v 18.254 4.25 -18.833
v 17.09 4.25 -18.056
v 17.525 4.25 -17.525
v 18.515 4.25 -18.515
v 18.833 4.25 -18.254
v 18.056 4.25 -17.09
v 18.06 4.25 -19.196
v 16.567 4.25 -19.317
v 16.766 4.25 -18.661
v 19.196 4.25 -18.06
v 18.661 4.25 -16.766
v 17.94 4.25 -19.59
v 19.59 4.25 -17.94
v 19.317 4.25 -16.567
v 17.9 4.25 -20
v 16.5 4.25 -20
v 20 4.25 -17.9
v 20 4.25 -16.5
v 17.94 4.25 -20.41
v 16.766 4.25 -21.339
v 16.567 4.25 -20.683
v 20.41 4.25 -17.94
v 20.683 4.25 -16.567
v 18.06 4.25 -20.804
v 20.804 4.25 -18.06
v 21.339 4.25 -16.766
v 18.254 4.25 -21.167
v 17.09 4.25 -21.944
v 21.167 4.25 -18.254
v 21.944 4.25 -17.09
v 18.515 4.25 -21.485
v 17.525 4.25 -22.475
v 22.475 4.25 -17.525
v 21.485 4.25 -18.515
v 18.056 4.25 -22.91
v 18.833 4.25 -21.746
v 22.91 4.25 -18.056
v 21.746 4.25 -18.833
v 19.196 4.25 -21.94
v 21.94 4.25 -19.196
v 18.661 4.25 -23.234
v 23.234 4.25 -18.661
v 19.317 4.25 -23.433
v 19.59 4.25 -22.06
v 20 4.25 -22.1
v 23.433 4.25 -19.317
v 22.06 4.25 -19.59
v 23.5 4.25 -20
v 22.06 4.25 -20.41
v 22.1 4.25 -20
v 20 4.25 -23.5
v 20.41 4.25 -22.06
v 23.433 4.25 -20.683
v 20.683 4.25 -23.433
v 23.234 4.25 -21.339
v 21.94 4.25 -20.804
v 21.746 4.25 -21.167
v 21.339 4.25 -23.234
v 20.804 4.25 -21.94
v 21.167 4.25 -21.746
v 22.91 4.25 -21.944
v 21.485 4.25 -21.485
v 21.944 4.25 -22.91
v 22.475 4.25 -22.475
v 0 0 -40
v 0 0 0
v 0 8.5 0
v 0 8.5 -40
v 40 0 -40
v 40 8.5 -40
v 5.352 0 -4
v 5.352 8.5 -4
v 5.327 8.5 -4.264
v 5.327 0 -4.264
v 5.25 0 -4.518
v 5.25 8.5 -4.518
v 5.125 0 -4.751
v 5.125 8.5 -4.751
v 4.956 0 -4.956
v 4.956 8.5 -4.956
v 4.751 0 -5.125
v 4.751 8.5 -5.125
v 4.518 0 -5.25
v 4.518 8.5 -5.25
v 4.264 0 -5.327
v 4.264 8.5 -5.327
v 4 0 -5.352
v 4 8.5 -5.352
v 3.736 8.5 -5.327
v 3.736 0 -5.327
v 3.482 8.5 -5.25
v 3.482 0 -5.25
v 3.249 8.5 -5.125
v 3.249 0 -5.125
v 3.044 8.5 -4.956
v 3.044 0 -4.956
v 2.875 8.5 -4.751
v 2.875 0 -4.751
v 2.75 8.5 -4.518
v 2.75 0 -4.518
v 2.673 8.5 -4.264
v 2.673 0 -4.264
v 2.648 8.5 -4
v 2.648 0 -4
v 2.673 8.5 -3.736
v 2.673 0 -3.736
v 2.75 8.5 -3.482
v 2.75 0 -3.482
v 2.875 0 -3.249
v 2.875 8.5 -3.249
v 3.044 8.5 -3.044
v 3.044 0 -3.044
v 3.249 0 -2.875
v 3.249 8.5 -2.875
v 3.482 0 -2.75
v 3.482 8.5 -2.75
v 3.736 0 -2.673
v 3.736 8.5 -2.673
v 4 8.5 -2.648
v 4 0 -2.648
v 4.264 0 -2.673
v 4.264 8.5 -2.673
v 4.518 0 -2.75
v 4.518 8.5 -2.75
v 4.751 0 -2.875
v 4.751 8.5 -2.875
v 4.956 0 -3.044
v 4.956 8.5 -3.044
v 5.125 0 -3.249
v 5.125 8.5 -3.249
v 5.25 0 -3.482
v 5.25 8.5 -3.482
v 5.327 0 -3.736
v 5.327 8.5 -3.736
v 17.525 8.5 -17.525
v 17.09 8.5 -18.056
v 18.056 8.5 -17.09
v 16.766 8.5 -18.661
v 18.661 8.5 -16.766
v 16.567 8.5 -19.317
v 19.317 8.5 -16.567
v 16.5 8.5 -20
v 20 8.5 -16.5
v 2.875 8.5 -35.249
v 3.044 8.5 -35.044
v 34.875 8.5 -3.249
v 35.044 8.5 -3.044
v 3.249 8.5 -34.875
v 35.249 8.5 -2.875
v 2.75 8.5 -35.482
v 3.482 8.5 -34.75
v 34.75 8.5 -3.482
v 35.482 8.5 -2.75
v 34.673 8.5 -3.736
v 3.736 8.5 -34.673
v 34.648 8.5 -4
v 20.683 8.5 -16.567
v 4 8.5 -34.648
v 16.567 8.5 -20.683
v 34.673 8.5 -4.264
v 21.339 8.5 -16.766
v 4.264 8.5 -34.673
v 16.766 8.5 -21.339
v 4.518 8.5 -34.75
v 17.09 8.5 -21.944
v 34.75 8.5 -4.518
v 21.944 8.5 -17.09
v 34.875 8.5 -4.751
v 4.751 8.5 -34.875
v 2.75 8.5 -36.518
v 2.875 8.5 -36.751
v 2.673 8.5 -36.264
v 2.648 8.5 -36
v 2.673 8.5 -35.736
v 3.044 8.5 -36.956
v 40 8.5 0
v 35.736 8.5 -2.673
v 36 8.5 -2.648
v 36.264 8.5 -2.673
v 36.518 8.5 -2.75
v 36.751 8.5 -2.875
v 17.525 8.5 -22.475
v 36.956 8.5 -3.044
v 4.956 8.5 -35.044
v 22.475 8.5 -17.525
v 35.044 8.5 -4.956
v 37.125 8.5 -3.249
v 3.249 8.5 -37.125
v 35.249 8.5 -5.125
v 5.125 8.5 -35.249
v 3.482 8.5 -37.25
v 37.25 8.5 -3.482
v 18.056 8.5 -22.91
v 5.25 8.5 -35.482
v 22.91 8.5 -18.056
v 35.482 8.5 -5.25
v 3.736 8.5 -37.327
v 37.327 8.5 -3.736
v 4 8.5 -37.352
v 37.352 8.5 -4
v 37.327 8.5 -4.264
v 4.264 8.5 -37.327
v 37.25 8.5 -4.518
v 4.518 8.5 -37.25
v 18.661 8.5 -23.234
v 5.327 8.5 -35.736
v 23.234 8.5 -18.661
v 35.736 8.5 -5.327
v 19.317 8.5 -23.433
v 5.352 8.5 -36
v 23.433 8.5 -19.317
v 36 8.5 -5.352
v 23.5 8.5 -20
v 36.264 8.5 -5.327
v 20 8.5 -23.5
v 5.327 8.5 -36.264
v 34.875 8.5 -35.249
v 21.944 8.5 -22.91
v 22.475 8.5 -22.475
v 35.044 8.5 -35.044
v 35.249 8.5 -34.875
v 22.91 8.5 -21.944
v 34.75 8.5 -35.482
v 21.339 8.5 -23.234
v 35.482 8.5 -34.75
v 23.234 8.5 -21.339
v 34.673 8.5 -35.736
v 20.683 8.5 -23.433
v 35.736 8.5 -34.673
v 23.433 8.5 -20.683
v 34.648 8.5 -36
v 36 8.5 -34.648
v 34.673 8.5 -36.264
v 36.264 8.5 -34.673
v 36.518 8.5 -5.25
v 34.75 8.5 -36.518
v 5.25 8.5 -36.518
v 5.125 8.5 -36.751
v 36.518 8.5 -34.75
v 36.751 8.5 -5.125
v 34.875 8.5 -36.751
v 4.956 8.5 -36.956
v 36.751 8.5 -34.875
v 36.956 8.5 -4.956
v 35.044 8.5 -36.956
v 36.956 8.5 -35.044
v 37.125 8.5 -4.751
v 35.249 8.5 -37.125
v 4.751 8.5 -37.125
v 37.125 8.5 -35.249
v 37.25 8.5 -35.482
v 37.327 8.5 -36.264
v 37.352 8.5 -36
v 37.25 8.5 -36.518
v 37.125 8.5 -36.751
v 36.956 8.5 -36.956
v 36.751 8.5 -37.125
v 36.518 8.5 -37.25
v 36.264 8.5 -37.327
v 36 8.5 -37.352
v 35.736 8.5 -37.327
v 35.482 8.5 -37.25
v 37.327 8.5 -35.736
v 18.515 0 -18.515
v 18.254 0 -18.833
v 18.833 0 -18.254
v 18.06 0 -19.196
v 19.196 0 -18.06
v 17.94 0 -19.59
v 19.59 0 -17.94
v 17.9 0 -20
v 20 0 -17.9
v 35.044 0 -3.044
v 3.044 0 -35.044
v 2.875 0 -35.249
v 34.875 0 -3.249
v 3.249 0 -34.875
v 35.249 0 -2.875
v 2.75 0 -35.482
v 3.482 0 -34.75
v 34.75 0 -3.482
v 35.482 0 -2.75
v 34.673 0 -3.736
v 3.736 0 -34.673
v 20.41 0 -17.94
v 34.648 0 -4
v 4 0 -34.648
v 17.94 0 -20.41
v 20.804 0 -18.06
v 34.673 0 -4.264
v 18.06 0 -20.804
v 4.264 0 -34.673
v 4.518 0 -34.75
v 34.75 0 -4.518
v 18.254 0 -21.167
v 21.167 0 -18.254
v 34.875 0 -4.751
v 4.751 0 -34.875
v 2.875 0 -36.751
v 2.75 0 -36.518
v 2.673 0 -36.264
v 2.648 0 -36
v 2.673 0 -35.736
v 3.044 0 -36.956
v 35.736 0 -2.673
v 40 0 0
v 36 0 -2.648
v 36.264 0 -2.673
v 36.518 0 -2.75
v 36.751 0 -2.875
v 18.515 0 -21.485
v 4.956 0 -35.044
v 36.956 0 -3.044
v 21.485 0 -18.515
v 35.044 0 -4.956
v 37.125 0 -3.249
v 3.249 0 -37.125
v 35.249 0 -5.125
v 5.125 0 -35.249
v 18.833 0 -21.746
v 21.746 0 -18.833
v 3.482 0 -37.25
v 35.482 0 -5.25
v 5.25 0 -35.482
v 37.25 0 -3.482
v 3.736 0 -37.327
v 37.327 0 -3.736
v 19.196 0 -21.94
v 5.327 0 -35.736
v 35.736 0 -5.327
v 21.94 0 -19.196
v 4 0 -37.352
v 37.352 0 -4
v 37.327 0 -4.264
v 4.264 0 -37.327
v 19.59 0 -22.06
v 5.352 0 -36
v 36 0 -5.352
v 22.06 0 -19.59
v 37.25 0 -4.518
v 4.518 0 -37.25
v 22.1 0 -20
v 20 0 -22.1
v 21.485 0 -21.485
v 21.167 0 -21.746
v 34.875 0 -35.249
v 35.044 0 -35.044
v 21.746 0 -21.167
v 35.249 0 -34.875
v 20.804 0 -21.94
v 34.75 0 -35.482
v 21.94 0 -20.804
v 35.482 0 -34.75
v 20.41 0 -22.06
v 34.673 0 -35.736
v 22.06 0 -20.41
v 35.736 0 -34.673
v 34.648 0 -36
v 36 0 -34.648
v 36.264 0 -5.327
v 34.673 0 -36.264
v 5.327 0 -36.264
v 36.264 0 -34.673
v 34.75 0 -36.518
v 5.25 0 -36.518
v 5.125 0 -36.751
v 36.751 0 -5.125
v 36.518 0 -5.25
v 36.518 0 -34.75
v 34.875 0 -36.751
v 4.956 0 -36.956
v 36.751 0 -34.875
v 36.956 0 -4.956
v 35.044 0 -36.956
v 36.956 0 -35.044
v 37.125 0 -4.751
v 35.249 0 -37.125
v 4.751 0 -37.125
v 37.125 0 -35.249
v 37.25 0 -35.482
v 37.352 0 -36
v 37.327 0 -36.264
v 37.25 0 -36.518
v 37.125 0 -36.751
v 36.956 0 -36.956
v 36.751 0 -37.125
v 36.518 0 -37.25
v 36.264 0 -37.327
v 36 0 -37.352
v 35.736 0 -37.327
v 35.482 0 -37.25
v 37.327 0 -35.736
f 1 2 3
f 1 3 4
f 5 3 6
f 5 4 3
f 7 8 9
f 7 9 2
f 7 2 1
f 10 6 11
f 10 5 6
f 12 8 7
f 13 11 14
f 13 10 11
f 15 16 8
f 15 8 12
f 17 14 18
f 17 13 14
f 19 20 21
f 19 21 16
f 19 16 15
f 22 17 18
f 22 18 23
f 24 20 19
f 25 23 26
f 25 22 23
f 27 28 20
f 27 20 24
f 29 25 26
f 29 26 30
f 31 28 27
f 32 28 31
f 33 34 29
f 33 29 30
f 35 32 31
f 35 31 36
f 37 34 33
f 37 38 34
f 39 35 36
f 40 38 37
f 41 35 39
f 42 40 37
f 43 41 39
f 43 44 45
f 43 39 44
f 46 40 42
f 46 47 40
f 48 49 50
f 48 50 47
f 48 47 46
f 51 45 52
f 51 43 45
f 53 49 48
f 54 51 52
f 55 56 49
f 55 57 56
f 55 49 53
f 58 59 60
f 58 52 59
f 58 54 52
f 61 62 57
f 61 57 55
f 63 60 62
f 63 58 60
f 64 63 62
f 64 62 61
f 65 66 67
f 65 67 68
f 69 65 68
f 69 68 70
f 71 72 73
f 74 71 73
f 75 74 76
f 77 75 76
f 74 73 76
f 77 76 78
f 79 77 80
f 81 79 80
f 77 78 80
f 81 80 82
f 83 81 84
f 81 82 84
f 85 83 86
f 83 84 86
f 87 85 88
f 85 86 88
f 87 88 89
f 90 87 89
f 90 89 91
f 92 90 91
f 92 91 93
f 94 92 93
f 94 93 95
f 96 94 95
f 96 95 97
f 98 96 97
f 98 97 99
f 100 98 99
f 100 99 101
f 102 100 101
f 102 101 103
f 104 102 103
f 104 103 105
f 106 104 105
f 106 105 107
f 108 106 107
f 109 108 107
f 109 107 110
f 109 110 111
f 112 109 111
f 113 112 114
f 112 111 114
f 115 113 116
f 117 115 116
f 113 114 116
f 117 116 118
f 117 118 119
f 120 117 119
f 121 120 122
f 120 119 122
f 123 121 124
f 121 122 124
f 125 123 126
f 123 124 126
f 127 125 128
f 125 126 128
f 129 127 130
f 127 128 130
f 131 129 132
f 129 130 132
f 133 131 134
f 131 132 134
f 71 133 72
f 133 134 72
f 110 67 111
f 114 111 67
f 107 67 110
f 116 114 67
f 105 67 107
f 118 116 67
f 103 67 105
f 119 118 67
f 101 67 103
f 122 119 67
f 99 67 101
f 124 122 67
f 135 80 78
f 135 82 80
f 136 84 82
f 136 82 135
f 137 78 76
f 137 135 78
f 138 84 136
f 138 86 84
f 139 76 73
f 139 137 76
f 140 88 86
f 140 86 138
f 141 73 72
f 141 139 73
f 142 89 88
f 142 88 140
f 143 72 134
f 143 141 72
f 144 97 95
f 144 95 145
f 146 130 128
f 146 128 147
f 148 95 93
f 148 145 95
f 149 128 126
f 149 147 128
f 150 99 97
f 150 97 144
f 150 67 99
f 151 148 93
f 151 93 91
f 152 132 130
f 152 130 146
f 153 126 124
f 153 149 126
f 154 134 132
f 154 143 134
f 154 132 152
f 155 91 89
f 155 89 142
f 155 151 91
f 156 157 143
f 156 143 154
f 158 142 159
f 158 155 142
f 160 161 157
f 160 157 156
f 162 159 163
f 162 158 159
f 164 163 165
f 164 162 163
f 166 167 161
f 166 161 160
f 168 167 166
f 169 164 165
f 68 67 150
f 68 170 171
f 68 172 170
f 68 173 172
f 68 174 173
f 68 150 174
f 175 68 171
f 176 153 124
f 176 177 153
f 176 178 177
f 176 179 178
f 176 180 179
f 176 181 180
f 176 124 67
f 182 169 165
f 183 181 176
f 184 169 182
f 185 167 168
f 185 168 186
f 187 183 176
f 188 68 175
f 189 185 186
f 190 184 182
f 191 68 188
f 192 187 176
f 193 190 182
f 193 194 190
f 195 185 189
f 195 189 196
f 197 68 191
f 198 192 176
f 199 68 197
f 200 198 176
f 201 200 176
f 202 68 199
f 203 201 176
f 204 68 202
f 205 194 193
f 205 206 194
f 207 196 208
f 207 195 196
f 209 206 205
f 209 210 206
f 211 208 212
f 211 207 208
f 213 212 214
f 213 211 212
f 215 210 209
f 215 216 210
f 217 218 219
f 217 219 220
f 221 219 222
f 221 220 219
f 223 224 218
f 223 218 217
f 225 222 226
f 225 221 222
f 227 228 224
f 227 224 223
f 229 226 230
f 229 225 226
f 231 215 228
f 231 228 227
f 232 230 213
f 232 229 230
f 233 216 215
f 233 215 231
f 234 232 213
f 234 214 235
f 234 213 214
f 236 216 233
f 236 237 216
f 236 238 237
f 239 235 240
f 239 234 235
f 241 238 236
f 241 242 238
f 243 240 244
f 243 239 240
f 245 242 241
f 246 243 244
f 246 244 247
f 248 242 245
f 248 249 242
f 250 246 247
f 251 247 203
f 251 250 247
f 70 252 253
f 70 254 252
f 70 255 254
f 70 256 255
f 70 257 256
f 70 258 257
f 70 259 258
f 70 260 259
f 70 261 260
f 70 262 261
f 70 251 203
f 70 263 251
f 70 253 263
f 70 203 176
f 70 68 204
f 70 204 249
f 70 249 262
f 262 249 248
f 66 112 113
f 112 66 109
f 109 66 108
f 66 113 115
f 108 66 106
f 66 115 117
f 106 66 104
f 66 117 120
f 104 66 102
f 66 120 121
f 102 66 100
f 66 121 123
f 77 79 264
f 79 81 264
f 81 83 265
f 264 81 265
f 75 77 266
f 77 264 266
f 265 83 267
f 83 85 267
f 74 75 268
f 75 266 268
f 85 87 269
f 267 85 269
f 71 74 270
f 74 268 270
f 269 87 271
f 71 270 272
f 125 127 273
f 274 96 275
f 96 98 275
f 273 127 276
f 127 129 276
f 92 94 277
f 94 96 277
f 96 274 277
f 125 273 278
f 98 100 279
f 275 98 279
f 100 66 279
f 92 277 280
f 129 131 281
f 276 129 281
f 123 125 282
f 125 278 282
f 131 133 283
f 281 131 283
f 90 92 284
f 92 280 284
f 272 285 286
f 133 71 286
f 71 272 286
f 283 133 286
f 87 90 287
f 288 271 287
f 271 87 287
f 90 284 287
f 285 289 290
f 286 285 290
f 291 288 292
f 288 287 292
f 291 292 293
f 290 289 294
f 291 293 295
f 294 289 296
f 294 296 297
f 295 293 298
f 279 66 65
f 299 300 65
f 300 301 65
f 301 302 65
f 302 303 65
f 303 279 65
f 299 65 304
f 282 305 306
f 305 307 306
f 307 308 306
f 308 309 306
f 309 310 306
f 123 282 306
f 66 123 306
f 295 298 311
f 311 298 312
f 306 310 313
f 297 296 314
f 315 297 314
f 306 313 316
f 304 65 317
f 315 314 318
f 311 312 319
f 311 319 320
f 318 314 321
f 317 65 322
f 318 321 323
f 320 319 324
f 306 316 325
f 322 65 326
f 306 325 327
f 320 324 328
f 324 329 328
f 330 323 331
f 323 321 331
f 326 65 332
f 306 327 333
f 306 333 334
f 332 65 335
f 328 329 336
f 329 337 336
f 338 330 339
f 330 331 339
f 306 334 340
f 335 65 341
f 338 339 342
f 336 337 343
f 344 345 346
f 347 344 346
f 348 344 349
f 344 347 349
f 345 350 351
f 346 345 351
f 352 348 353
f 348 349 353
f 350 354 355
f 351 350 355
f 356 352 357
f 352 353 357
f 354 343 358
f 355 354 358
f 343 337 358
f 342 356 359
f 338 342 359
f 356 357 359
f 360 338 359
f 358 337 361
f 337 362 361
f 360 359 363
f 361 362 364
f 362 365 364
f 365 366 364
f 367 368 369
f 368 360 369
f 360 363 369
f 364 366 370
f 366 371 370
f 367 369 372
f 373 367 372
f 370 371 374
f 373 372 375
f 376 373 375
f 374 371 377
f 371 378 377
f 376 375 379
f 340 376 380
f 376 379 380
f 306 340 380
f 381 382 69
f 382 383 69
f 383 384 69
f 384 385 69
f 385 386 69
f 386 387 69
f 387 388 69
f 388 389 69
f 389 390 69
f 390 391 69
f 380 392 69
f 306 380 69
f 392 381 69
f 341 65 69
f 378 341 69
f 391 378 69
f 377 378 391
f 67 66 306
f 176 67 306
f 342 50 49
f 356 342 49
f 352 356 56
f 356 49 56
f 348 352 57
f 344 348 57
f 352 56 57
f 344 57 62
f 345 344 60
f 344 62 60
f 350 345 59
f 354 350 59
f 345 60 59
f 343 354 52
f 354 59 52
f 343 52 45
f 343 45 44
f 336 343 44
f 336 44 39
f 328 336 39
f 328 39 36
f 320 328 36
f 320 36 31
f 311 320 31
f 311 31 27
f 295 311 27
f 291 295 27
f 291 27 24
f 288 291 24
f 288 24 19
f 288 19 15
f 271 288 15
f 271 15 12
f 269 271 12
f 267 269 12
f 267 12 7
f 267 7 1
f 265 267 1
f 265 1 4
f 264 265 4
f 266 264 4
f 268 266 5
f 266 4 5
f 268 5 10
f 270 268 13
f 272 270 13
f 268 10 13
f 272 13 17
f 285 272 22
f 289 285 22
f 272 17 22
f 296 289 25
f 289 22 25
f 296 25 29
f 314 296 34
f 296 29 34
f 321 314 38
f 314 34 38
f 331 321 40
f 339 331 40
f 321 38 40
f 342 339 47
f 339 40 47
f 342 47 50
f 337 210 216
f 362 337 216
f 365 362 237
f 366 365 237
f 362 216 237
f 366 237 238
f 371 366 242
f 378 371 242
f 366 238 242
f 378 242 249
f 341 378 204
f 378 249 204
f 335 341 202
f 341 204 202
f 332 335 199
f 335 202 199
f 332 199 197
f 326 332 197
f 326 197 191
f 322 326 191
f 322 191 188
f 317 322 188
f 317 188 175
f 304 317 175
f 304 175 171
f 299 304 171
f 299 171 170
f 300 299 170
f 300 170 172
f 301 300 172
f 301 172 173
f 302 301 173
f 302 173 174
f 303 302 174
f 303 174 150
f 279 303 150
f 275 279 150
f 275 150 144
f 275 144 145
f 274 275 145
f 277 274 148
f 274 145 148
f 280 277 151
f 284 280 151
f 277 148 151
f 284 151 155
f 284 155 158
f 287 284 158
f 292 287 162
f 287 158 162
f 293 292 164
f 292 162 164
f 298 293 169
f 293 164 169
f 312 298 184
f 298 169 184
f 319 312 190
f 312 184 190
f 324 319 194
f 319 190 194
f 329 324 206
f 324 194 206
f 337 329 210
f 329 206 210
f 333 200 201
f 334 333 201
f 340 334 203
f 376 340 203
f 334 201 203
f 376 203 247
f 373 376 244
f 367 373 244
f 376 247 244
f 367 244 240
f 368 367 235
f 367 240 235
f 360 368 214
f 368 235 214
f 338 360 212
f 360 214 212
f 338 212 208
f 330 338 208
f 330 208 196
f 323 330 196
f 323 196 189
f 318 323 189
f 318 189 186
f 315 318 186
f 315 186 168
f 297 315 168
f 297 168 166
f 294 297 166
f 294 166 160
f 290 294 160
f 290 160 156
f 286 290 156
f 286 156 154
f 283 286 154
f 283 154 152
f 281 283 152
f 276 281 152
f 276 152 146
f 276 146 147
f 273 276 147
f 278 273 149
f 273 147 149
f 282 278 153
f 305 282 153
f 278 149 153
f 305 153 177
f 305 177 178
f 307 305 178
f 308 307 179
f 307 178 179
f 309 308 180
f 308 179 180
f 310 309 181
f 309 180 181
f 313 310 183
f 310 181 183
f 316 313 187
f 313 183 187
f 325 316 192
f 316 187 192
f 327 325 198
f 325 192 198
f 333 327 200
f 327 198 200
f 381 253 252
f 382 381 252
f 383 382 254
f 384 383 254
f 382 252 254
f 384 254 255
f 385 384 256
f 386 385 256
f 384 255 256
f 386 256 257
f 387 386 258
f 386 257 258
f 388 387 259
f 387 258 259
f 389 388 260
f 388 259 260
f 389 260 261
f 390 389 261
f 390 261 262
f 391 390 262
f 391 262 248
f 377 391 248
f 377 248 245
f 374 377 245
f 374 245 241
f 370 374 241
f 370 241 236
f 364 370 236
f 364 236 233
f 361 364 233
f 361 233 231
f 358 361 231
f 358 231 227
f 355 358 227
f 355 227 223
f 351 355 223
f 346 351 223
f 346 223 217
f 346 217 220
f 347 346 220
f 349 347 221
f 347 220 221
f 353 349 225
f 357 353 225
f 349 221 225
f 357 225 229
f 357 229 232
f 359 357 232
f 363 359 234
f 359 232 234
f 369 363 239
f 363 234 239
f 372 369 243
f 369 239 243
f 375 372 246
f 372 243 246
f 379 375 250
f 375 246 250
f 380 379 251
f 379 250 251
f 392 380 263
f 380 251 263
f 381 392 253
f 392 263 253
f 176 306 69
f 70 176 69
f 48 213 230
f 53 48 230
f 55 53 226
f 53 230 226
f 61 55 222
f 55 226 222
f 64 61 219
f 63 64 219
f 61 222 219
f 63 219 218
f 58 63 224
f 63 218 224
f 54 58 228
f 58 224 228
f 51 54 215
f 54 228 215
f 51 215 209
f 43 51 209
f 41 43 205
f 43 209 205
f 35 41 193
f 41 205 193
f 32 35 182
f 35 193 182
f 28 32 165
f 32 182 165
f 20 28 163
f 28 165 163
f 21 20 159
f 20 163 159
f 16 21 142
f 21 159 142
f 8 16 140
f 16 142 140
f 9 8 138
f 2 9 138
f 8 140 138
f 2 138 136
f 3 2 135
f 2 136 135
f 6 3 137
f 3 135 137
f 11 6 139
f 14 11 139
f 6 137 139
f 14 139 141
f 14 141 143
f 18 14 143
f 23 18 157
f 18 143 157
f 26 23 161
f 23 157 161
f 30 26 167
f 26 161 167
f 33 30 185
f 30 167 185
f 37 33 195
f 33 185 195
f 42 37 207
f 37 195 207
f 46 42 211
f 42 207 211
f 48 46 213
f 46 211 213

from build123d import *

# Parameters (mm, degrees)
SKETCH1_W           = 40
SKETCH1_H           = 40
BOSS_EXTRUDE1_DEPTH = 8.5
SKETCH2_R           = 1.3525
SKETCH2_R_2         = 2.1
CUT_EXTRUDE1_DEPTH  = 9.5
SKETCH3_R           = 3.5
CUT_EXTRUDE2_DEPTH  = 4.25


with BuildPart() as part:
    # Sketch1 → Boss-Extrude1 (new body)
    with BuildSketch(Plane(origin=(0, 0, 0), x_dir=(1, 0, 0), z_dir=(0, 1, 0))):
        with Locations((20, 20)):
            Rectangle(SKETCH1_W, SKETCH1_H)
    extrude(amount=BOSS_EXTRUDE1_DEPTH)

    # Sketch2 → Cut-Extrude1 (cut, through all)
    with BuildSketch(Plane(origin=(0, 8.5, 0), x_dir=(1, 0, 0), z_dir=(0, 1, 0))):
        with Locations((4, 4)):
            Circle(SKETCH2_R)
        with Locations((36, 4)):
            Circle(SKETCH2_R)
        with Locations((36, 36)):
            Circle(SKETCH2_R)
        with Locations((4, 36)):
            Circle(SKETCH2_R)
        with Locations((20, 20)):
            Circle(SKETCH2_R_2)
    extrude(amount=-CUT_EXTRUDE1_DEPTH, mode=Mode.SUBTRACT)

    # Sketch3 → Cut-Extrude2 (cut)
    with BuildSketch(Plane(origin=(0, 8.5, 0), x_dir=(1, 0, 0), z_dir=(0, 1, 0))):
        with Locations((20, 20)):
            Circle(SKETCH3_R)
    extrude(amount=-CUT_EXTRUDE2_DEPTH, mode=Mode.SUBTRACT)


solid = part.part
